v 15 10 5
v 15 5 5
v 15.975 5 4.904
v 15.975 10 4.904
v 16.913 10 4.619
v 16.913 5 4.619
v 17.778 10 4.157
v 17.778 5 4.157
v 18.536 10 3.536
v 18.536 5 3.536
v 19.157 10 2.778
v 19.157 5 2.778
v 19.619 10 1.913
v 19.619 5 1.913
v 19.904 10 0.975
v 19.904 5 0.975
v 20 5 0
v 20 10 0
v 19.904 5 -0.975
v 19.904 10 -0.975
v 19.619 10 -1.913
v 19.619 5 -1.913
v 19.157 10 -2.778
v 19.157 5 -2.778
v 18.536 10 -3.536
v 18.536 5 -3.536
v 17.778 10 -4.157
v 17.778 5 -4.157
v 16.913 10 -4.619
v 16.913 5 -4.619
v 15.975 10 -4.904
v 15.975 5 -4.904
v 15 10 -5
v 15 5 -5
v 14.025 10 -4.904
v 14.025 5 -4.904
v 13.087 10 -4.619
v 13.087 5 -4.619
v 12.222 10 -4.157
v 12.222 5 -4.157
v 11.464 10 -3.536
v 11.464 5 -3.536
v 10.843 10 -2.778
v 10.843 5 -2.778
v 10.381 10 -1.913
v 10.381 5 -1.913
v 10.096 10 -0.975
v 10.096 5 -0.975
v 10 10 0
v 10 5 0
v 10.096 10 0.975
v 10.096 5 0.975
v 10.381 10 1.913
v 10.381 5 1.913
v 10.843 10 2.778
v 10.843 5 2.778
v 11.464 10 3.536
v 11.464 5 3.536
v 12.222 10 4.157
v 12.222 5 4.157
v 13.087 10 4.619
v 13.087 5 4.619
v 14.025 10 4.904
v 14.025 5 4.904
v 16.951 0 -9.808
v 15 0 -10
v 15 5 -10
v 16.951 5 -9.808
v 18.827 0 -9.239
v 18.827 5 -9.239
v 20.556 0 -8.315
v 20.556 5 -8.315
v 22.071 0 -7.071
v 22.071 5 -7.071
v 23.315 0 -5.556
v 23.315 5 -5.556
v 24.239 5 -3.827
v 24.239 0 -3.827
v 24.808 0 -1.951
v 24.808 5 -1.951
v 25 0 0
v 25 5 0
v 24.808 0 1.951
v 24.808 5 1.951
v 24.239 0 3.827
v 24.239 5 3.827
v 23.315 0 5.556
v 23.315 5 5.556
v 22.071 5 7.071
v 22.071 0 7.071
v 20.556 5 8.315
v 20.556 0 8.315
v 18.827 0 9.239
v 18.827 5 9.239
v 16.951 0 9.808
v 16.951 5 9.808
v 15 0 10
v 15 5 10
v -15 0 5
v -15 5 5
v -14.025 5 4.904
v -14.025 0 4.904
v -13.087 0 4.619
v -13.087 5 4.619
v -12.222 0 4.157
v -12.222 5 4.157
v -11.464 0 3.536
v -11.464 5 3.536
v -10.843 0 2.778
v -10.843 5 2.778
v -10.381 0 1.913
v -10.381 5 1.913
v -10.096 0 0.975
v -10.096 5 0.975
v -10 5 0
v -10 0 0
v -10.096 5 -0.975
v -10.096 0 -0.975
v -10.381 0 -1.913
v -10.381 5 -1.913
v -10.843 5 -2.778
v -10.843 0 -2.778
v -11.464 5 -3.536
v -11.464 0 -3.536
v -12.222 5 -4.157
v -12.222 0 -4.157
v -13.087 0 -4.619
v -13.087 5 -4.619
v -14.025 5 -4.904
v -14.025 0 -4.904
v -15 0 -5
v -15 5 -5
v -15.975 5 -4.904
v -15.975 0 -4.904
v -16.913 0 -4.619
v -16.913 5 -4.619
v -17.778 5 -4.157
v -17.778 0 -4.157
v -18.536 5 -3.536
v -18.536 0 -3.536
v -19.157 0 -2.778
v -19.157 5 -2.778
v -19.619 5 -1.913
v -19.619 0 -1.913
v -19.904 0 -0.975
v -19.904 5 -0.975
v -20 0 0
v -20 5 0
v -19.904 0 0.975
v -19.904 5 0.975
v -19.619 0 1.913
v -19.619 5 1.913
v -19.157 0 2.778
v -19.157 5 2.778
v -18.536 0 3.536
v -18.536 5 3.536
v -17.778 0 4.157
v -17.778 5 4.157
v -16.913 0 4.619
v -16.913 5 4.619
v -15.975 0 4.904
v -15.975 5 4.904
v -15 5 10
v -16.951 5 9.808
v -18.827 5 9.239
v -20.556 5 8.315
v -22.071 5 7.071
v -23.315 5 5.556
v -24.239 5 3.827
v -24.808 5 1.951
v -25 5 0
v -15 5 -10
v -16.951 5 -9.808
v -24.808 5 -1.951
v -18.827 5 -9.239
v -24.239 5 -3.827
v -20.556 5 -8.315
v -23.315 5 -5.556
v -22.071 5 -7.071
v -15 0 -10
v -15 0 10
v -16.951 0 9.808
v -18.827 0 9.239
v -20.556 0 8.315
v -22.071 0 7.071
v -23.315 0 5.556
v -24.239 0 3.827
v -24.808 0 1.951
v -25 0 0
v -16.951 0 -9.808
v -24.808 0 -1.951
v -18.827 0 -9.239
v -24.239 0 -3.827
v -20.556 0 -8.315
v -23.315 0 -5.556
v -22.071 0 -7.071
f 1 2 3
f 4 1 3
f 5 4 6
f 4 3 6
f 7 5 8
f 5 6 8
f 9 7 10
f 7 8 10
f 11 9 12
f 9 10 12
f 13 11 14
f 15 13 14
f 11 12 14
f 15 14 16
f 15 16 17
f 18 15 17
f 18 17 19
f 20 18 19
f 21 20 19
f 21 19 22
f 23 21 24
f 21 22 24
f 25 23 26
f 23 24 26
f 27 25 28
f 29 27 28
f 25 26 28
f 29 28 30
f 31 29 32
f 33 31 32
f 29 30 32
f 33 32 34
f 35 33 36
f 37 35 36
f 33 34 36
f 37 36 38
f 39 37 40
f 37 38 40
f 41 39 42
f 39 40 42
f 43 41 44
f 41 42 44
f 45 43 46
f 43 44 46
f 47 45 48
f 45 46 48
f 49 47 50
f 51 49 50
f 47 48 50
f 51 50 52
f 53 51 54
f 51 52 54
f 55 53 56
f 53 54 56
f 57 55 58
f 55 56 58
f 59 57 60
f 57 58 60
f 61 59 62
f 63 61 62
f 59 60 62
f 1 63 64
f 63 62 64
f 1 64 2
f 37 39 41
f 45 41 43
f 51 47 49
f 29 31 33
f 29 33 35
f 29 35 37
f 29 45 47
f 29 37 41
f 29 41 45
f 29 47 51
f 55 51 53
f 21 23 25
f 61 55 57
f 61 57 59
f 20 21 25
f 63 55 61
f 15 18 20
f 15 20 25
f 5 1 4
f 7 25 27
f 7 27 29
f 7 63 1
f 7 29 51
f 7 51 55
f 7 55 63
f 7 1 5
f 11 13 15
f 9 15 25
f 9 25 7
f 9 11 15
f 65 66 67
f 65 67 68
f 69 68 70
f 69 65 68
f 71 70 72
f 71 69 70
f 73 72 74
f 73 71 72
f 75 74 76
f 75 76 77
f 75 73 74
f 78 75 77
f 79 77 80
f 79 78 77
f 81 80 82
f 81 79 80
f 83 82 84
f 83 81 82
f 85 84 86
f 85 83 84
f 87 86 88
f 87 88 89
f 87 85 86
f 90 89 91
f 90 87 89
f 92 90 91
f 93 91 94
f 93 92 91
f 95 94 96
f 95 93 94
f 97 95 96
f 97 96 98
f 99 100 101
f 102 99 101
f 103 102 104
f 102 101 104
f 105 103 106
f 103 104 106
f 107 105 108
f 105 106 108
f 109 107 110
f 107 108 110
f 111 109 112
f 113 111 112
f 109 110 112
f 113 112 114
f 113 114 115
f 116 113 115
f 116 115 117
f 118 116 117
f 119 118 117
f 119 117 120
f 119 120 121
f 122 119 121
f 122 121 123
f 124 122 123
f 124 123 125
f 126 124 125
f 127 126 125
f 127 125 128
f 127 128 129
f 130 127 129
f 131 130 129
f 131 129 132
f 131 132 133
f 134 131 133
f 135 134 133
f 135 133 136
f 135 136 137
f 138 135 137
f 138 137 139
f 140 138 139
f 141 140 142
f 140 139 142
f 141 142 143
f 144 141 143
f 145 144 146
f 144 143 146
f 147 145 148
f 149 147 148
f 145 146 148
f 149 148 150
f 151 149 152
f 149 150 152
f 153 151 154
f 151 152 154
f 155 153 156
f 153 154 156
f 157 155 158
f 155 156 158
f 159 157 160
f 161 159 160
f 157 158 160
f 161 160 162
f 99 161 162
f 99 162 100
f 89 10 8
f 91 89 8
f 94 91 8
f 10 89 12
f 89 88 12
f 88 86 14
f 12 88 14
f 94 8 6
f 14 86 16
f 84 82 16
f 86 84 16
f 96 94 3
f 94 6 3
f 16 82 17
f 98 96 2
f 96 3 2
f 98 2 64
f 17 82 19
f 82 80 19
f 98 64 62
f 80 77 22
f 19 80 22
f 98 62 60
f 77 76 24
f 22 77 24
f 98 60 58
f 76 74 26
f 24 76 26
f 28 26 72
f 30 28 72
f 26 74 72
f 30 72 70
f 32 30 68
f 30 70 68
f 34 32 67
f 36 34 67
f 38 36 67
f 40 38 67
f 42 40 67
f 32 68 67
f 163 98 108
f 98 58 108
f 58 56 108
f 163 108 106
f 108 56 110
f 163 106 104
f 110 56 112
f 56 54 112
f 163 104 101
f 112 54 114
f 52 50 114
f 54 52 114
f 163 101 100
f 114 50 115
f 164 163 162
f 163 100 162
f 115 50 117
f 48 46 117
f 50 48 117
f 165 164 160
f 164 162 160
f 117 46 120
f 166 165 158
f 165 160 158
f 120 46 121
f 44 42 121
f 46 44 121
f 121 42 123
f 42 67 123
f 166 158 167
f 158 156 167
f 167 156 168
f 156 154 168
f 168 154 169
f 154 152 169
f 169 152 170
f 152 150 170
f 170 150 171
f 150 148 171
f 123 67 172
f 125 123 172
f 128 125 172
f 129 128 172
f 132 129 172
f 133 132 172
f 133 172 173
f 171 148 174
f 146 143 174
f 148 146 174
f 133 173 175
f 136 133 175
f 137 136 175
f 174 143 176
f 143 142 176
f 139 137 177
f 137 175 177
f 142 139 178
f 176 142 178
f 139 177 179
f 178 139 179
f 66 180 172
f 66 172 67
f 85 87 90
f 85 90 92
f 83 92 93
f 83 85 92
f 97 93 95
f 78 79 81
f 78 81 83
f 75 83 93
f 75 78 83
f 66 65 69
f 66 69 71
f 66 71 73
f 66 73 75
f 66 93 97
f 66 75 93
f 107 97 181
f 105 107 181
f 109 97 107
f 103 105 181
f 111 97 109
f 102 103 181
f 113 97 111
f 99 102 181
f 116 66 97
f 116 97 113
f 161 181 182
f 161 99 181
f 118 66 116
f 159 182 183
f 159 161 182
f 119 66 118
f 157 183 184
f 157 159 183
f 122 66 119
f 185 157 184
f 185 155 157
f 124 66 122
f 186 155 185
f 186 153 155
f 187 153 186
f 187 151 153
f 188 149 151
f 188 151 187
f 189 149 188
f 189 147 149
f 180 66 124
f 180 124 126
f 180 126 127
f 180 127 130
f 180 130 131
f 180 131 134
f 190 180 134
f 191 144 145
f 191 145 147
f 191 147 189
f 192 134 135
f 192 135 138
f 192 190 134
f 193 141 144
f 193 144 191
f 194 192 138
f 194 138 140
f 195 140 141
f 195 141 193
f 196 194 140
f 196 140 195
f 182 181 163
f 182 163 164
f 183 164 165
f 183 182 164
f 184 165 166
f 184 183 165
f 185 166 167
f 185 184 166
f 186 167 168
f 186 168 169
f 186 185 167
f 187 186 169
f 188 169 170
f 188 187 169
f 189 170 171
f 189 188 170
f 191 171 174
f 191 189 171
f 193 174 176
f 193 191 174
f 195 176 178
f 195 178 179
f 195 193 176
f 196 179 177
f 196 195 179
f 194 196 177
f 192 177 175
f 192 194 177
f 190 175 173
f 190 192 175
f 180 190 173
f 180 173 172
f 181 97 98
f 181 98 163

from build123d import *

# Parameters (mm, degrees)
BOSS_EXTRUDE1_DEPTH = 5
SKETCH2_R           = 5
BOSS_EXTRUDE2_DEPTH = 5
SKETCH3_R           = 5
CUT_EXTRUDE1_DEPTH  = 28.386127875


with BuildPart() as part:
    # Sketch1 → Boss-Extrude1 (new body)
    with BuildSketch(Plane(origin=(0, 0, 0), x_dir=(1, 0, 0), z_dir=(0, 1, 0))):
        with BuildLine():
            Line((-15, 10), (15, 10))
            ThreePointArc((15, 10), (25, 0), (15, -10))
            Line((15, -10), (-15, -10))
            ThreePointArc((-15, -10), (-25, 0), (-15, 10))
        make_face()
    extrude(amount=BOSS_EXTRUDE1_DEPTH)

    # Sketch2 → Boss-Extrude2 (add)
    with BuildSketch(Plane(origin=(0, 5, 0), x_dir=(1, 0, 0), z_dir=(0, 1, 0))):
        with Locations(Location((15, 0, 0), (0, 0, 270))):
            Circle(SKETCH2_R)
    extrude(amount=BOSS_EXTRUDE2_DEPTH)

    # Sketch3 → Cut-Extrude1 (cut, through all)
    with BuildSketch(Plane(origin=(0, 5, 0), x_dir=(1, 0, 0), z_dir=(0, 1, 0))):
        with Locations(Location((-15, 0, 0), (0, 0, 270))):
            Circle(SKETCH3_R)
    extrude(amount=-CUT_EXTRUDE1_DEPTH, mode=Mode.SUBTRACT)


solid = part.part
